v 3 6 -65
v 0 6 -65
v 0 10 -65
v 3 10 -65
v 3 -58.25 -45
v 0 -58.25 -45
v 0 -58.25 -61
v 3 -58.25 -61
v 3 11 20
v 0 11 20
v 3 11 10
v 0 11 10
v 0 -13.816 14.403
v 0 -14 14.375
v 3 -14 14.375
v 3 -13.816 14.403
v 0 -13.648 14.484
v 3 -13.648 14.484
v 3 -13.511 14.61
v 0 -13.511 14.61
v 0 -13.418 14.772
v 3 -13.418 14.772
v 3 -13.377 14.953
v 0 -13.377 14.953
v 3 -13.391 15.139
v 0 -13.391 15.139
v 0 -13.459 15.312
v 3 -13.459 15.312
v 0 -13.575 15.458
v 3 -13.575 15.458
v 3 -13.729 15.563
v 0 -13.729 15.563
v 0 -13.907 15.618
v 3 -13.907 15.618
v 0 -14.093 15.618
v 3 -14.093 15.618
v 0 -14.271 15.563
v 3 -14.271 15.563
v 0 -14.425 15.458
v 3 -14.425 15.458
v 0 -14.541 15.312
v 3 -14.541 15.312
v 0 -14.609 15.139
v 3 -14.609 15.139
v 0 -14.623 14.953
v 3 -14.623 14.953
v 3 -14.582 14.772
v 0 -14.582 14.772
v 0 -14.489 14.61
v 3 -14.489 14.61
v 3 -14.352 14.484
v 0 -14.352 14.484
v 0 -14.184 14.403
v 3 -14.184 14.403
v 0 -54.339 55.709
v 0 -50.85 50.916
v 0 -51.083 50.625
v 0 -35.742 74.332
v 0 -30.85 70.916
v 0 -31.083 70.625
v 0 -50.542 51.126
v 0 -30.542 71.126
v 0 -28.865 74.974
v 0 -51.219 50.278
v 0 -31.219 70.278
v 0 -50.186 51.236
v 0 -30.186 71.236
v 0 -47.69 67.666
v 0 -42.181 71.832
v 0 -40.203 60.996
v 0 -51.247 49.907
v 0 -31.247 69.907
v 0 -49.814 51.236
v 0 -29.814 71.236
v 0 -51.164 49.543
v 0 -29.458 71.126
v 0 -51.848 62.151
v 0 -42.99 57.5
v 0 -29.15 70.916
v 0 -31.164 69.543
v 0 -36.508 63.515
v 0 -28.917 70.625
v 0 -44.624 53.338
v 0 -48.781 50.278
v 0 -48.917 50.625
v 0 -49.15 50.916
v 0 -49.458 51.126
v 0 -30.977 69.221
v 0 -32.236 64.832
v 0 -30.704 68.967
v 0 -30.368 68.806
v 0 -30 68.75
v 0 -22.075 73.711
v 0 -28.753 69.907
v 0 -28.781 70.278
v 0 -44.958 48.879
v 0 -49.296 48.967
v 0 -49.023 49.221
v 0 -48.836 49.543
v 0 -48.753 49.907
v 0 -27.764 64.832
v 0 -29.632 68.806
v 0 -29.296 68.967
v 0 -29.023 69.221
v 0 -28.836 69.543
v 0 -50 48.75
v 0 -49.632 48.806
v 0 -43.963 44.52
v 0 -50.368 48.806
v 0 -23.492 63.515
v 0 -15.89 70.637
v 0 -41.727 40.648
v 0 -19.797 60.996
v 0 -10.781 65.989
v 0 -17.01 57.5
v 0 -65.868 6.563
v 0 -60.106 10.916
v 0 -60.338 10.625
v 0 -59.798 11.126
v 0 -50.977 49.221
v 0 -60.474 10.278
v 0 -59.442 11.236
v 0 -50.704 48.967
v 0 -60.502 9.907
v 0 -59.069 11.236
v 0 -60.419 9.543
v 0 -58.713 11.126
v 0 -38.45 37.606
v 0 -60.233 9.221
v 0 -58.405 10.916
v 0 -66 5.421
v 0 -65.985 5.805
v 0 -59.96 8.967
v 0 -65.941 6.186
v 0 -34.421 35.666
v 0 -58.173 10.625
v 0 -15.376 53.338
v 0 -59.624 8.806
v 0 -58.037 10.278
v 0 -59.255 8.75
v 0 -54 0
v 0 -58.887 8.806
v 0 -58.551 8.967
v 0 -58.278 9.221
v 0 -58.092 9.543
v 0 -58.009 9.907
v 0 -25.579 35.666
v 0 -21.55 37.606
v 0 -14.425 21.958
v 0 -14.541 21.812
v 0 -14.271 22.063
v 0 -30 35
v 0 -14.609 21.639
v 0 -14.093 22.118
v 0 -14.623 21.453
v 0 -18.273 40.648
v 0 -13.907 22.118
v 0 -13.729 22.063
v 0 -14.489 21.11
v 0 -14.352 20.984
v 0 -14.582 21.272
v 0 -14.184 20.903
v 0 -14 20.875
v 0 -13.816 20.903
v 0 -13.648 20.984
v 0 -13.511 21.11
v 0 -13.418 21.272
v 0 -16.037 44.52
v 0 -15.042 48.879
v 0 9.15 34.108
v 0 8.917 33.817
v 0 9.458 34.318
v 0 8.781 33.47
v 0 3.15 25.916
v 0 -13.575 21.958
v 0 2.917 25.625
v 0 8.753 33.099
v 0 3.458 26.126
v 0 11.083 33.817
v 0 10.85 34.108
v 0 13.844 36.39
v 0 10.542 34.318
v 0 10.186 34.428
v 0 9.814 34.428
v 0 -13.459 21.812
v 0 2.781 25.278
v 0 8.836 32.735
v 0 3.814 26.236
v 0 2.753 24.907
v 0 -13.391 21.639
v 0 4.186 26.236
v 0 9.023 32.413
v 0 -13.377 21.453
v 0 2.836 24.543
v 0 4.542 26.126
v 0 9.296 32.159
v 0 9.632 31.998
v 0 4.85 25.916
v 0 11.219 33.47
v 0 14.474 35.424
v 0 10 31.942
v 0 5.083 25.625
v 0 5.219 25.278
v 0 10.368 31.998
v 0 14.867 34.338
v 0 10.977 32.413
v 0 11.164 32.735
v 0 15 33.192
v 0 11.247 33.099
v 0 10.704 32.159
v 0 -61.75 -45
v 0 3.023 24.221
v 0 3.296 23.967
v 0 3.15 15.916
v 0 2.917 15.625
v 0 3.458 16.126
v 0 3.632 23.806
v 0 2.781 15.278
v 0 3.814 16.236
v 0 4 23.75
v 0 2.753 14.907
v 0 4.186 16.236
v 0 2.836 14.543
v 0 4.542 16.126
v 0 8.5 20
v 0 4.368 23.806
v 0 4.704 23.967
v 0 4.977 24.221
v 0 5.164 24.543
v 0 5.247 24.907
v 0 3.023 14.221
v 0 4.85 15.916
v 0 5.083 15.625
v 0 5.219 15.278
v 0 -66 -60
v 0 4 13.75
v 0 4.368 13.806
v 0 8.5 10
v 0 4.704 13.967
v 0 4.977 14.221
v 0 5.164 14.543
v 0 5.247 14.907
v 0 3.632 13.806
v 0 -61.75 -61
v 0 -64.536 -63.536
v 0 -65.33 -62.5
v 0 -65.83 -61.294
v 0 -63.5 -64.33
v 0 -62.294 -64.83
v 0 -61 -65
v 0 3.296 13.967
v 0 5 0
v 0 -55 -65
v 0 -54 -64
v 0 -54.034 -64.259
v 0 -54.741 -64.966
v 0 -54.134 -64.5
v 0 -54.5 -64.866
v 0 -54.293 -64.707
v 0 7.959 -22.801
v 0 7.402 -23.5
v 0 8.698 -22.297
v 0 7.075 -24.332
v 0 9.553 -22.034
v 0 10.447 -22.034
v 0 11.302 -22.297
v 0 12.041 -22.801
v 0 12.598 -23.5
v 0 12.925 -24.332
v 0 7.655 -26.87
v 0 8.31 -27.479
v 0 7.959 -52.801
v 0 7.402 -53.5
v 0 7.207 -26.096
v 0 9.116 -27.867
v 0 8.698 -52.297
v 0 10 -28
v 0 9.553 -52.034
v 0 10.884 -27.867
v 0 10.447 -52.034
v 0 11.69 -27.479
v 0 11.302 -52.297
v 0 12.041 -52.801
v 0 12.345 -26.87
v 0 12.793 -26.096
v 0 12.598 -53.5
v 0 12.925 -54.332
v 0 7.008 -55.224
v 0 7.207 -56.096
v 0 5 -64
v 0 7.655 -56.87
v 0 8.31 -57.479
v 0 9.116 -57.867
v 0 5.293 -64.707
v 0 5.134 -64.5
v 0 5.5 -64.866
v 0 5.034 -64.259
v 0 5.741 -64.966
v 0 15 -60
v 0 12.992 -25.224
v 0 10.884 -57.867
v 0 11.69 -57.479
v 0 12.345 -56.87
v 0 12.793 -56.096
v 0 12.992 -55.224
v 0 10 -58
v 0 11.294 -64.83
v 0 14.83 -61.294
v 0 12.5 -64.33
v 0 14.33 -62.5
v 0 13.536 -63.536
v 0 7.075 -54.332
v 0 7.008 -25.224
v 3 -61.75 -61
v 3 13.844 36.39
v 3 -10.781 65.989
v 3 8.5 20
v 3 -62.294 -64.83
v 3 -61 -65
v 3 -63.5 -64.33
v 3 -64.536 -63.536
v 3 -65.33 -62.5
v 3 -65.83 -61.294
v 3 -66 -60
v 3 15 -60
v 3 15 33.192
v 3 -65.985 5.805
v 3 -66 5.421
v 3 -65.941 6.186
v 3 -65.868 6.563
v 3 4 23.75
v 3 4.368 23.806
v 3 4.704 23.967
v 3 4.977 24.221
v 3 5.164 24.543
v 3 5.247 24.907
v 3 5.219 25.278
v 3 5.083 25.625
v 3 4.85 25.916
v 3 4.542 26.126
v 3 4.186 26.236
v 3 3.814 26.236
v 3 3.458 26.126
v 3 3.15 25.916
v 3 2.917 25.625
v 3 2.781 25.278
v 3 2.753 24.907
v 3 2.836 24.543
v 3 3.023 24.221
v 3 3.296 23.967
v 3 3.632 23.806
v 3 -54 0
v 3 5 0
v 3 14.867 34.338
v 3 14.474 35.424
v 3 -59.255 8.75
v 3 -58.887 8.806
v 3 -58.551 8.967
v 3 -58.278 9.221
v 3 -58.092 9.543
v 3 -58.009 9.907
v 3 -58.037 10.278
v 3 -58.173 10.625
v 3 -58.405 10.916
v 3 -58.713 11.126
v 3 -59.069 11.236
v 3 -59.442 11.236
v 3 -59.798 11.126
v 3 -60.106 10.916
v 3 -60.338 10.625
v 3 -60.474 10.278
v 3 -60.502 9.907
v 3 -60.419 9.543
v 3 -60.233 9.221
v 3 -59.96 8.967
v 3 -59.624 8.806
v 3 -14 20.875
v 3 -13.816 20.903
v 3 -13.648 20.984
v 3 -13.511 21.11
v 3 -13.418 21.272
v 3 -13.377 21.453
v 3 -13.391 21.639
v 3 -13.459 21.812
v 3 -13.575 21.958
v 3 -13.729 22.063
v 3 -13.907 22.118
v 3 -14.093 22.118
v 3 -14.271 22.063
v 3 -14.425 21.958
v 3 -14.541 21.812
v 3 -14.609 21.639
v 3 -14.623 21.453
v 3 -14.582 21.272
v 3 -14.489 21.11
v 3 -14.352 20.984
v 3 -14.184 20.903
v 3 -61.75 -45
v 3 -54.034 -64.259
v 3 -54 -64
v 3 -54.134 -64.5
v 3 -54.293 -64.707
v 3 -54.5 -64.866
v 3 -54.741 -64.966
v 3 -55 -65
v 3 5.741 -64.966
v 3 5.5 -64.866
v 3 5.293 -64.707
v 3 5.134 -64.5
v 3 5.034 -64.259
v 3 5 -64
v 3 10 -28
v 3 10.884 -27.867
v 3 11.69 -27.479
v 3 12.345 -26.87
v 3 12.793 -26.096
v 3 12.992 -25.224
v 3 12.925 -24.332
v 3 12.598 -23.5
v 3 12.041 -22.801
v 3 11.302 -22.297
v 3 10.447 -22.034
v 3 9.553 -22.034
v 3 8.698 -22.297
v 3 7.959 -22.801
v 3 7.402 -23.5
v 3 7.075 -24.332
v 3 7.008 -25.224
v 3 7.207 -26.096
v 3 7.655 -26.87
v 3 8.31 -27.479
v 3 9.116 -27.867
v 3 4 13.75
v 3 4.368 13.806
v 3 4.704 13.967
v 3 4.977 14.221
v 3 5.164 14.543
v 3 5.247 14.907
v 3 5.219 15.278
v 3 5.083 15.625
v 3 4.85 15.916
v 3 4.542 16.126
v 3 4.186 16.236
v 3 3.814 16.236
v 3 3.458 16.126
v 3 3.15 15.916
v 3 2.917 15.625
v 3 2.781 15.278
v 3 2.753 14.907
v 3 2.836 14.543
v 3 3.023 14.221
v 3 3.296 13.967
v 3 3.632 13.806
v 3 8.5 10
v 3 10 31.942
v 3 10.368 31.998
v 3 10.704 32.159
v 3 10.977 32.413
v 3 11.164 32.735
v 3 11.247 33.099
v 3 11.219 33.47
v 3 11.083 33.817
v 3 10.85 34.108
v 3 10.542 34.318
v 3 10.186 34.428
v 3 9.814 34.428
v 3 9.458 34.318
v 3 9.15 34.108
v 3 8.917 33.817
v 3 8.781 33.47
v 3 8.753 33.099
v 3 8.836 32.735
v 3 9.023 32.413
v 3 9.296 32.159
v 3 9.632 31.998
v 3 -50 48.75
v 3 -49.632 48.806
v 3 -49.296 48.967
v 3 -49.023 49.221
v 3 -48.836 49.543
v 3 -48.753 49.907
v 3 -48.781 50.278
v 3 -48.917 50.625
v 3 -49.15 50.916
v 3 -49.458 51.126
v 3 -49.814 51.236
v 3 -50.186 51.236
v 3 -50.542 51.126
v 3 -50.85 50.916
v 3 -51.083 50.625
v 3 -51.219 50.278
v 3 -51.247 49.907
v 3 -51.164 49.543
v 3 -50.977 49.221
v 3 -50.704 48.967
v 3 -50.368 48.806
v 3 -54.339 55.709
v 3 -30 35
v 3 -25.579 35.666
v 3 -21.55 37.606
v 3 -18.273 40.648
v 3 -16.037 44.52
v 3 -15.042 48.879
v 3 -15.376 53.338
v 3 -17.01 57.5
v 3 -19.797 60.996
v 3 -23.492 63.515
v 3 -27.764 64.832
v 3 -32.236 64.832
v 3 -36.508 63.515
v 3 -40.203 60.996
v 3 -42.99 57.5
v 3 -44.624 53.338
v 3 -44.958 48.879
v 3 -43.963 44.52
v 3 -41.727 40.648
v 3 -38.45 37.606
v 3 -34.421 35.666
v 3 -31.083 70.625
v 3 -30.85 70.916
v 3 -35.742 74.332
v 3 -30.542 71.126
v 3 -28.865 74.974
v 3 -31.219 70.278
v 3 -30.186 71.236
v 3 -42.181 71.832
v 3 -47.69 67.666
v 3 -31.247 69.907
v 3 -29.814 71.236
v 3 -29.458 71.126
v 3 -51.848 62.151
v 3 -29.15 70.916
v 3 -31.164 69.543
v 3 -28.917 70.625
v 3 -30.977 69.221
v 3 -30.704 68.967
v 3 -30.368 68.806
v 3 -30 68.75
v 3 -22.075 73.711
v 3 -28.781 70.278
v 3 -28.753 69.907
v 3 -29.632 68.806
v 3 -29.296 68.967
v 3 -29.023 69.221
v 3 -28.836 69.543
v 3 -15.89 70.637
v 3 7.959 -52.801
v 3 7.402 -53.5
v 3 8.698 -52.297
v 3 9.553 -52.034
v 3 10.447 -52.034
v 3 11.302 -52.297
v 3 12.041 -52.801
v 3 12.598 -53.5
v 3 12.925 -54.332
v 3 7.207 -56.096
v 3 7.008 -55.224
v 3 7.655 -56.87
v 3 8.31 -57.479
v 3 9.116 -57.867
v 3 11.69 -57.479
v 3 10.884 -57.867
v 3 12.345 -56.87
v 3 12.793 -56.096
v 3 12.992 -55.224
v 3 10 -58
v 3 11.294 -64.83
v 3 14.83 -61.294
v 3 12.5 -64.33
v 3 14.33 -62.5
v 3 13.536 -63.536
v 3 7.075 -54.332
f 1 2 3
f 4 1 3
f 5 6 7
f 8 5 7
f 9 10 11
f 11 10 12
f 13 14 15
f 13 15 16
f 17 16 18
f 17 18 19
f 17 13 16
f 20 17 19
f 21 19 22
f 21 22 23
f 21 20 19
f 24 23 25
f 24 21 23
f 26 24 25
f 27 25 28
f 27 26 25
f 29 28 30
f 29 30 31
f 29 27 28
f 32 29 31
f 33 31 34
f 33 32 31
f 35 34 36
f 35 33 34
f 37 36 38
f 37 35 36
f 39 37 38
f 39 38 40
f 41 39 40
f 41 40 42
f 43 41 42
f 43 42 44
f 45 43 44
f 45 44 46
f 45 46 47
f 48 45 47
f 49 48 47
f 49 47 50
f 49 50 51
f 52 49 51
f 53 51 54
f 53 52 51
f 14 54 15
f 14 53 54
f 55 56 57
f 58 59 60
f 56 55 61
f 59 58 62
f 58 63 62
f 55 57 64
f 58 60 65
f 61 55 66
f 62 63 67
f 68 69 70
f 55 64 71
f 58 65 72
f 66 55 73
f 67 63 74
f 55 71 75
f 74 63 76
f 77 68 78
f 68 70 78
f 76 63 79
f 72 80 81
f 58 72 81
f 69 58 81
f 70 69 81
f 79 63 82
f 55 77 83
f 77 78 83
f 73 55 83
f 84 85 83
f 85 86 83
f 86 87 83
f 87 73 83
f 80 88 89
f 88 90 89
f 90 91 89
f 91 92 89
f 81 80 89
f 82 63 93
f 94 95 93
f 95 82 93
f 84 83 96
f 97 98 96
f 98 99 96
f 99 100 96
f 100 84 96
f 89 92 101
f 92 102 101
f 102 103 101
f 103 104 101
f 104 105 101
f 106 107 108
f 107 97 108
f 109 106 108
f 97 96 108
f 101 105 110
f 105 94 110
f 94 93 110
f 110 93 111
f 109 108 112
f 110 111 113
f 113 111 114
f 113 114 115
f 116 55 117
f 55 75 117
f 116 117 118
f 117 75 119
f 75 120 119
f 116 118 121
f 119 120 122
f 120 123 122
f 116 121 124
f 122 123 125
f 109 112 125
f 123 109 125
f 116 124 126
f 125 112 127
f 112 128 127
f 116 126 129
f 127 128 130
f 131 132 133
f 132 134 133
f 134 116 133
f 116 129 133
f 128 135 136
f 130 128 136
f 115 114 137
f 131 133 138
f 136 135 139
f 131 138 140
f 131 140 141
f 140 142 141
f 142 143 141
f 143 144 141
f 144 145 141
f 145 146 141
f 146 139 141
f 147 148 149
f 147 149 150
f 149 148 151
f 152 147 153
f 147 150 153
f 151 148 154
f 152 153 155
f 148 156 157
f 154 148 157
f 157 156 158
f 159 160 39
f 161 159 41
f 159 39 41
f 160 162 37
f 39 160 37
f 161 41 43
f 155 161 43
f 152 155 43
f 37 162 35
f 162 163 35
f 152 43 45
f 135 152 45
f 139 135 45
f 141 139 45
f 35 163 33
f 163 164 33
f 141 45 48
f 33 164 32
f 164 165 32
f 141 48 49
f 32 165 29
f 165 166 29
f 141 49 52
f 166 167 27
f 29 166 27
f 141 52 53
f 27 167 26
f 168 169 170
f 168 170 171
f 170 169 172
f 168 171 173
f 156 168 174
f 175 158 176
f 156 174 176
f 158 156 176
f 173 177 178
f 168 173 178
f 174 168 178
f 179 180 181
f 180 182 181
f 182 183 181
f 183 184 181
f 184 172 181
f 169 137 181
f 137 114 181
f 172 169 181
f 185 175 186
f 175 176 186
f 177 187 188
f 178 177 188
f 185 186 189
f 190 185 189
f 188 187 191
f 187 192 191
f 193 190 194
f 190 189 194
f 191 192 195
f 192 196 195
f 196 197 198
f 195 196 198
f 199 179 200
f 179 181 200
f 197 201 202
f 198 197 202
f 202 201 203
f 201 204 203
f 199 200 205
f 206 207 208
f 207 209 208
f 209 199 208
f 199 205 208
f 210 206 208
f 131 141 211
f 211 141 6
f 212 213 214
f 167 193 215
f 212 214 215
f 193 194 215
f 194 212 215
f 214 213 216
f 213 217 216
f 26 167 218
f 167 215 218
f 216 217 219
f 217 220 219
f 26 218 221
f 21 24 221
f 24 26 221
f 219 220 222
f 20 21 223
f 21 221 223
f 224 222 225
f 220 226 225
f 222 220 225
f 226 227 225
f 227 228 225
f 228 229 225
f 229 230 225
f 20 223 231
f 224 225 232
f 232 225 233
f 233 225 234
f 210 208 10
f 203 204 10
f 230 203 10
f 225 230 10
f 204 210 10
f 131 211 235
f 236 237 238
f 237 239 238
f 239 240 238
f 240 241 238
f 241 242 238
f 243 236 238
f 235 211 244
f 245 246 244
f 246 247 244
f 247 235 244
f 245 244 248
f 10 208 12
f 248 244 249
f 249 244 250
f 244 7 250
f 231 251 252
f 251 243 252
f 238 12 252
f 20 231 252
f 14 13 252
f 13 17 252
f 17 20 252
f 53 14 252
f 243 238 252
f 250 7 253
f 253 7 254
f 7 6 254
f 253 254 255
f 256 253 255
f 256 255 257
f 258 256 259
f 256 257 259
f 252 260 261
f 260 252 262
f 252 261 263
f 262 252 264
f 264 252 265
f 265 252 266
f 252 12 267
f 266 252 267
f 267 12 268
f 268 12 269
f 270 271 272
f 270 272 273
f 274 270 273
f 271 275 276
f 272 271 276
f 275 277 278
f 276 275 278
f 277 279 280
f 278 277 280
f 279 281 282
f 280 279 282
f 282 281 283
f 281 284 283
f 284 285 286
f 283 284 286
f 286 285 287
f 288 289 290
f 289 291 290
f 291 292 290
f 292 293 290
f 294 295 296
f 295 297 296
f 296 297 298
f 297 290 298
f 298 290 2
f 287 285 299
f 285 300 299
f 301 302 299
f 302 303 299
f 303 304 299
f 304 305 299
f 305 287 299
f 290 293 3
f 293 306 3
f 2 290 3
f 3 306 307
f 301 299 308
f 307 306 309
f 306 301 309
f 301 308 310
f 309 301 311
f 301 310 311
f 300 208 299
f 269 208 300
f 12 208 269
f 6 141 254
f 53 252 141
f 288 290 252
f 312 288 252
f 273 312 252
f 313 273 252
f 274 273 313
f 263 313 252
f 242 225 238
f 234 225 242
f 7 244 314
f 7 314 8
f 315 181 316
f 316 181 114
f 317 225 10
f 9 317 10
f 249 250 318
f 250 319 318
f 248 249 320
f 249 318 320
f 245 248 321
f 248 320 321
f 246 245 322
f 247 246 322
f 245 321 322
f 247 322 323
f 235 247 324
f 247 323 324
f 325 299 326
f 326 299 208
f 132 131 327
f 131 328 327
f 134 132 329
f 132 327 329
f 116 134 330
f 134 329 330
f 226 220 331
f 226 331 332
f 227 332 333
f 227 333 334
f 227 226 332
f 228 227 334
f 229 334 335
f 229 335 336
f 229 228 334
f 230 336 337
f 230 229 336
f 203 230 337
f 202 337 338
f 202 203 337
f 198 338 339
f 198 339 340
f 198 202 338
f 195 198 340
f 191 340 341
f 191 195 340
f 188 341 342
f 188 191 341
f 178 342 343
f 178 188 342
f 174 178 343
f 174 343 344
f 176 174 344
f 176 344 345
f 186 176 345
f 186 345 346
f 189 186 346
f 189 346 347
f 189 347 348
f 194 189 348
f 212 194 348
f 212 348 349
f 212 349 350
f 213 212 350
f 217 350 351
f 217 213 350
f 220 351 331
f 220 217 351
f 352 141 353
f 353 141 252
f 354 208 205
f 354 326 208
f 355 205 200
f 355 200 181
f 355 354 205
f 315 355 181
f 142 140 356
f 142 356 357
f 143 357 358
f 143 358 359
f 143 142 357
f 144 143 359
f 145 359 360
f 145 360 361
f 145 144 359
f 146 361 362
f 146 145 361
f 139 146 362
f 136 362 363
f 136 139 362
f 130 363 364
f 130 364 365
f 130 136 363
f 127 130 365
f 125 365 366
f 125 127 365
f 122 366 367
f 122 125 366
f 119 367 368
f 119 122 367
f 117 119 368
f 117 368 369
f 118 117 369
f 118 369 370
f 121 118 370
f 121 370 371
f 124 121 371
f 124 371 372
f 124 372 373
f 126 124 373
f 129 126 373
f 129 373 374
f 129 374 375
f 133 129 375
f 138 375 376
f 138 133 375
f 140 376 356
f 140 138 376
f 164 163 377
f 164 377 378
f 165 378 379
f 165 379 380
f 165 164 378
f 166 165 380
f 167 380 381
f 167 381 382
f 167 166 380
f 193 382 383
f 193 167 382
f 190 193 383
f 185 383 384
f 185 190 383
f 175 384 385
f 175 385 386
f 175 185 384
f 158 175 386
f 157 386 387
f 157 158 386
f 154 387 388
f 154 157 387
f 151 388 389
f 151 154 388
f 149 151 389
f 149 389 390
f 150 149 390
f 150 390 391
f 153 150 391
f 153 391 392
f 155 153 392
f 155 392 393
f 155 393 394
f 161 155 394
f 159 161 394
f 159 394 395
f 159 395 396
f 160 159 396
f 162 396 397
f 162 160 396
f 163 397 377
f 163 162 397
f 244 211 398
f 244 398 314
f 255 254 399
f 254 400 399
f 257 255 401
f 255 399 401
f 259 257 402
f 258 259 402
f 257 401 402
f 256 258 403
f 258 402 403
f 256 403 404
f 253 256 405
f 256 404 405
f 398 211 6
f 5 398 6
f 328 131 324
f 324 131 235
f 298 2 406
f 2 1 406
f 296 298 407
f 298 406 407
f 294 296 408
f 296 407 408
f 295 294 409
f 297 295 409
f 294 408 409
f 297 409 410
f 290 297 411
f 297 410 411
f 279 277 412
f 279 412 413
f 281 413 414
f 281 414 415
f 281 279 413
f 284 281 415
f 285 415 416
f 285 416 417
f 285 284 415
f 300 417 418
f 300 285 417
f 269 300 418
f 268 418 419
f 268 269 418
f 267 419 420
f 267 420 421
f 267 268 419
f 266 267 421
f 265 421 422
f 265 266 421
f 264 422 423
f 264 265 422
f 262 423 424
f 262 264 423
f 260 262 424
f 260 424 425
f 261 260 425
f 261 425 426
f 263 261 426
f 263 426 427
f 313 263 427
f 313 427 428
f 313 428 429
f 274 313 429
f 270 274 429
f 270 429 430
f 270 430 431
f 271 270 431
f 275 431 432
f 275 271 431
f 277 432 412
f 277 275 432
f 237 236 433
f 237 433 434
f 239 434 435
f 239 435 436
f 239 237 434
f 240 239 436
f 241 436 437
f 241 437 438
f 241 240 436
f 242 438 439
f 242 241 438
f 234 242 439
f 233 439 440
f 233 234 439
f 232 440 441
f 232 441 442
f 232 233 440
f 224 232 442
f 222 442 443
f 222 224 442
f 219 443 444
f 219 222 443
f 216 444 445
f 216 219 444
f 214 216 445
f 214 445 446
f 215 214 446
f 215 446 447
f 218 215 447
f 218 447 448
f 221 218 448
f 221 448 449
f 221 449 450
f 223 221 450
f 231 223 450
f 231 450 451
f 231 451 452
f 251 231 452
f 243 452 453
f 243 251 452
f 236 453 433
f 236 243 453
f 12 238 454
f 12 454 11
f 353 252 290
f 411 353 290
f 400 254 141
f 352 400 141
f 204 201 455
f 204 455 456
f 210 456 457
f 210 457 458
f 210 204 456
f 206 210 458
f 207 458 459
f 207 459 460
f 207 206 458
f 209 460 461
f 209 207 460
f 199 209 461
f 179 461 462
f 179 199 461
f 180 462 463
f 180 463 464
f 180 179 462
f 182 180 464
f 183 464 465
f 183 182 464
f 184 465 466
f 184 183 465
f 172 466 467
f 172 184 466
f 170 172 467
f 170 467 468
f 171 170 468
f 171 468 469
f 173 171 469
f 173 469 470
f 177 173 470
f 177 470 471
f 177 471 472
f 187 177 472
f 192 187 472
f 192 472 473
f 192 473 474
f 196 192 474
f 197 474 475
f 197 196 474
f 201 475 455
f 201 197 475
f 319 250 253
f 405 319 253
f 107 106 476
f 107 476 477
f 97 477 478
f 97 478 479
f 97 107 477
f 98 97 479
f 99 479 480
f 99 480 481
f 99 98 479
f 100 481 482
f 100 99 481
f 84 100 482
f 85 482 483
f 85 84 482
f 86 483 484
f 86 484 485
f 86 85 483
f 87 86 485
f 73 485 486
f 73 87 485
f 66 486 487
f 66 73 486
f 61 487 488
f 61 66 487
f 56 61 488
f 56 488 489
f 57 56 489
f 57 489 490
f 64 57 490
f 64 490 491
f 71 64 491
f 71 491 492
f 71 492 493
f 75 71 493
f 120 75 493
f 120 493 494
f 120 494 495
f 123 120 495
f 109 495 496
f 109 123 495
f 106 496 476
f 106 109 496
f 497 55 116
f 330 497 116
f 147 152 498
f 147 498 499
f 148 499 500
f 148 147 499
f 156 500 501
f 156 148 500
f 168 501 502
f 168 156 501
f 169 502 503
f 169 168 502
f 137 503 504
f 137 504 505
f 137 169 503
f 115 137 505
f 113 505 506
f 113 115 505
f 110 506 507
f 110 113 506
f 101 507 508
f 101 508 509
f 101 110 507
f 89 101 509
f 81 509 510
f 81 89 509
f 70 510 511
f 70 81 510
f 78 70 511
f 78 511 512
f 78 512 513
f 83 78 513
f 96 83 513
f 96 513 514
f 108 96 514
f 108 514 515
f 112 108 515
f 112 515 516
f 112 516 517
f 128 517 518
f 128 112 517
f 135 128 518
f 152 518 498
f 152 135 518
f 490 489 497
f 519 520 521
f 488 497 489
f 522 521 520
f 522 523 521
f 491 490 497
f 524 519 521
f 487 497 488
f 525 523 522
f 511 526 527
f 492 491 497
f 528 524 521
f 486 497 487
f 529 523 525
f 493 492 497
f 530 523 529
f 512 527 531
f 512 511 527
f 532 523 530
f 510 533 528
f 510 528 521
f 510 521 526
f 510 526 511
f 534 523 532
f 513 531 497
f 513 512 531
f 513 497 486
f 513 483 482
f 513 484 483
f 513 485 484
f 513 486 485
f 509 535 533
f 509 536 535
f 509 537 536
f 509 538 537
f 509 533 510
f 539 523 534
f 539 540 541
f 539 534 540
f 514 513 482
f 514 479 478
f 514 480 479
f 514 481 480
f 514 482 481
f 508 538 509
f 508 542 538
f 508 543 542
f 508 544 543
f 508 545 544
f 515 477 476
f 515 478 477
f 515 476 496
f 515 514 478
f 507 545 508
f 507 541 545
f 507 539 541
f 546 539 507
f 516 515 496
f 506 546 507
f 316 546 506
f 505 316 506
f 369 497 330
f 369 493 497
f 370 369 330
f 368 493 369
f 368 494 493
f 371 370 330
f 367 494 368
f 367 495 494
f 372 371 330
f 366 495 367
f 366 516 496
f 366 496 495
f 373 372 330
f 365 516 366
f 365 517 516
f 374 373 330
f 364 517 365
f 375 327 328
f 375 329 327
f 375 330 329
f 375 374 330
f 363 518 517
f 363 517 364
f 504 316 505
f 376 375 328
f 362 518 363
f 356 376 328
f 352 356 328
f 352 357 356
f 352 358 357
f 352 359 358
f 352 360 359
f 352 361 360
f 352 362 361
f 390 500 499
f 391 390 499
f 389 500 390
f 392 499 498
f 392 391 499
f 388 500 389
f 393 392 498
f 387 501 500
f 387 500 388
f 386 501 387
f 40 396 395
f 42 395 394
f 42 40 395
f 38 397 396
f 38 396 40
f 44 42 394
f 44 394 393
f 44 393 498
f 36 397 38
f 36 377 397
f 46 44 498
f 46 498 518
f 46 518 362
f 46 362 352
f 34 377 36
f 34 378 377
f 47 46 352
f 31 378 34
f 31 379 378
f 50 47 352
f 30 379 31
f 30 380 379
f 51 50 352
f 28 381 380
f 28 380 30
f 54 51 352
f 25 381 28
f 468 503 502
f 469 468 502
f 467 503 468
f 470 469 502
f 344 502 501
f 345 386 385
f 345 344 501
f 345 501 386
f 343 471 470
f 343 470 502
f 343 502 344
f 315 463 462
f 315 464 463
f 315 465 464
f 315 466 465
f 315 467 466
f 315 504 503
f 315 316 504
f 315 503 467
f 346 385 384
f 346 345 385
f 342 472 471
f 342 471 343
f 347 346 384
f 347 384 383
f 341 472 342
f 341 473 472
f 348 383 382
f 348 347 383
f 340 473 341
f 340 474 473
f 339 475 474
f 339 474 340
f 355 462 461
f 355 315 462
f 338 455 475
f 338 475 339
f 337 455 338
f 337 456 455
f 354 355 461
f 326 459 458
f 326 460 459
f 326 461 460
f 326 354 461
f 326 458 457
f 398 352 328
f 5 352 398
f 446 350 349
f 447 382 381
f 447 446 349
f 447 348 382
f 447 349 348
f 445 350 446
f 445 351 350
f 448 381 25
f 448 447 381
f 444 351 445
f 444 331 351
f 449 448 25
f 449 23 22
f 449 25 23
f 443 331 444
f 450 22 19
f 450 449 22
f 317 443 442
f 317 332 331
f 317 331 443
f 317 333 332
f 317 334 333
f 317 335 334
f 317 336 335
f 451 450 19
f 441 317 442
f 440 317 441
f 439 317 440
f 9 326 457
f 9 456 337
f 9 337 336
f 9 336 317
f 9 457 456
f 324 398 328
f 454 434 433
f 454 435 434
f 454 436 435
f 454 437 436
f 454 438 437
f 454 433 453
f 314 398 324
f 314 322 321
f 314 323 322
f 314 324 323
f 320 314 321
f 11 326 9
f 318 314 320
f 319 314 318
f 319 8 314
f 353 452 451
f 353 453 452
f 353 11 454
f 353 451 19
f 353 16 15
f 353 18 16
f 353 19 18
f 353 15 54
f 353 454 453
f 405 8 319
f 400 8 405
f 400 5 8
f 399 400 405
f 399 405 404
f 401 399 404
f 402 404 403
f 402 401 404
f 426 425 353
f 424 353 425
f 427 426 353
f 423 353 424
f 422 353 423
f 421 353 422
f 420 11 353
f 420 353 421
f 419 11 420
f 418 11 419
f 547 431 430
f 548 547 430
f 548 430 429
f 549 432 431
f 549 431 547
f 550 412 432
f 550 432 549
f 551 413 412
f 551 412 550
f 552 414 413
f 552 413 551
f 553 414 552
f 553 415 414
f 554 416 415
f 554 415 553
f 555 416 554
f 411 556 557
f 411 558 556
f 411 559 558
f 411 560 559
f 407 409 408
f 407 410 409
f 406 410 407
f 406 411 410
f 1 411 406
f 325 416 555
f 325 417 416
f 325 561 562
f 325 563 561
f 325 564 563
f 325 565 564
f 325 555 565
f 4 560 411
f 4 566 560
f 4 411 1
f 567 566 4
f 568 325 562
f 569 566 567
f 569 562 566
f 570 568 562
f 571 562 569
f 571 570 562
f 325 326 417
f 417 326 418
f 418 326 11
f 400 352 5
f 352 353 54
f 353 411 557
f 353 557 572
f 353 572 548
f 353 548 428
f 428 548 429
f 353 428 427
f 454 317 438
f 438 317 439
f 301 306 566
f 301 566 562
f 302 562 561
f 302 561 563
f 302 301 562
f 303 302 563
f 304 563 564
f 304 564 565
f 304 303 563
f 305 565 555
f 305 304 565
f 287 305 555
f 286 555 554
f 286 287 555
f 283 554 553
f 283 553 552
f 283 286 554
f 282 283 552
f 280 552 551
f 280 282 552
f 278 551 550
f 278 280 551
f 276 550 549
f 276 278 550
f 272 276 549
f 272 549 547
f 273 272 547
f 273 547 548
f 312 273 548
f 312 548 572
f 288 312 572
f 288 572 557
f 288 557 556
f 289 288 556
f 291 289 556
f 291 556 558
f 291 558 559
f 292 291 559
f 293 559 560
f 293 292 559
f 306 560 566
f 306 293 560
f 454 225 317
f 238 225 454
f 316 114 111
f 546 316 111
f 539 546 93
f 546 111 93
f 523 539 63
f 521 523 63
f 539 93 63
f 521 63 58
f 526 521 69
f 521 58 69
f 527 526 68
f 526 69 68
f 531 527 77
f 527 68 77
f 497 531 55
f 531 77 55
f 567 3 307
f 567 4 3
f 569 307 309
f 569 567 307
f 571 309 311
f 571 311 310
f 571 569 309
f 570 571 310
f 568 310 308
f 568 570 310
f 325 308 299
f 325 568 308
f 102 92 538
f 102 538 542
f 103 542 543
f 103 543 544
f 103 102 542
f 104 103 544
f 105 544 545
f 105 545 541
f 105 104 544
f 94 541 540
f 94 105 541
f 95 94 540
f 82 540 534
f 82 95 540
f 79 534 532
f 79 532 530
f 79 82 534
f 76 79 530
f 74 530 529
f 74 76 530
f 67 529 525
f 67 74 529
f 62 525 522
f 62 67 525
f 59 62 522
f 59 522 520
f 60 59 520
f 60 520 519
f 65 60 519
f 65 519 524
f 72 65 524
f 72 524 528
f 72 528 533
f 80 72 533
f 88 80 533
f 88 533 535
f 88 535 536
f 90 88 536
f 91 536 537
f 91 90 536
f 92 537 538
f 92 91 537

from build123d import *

# Parameters (mm, degrees)
SKETCH1_R           = 15
SKETCH1_R_2         = 3
SKETCH1_R_3         = 1.25
SKETCH1_R_4         = 0.625
SKETCH1_W           = 10
SKETCH1_H           = 2.5
SKETCH1_W_2         = 16
SKETCH1_H_2         = 3.5
BOSS_EXTRUDE1_DEPTH = 3
FILLET1_R           = 5
FILLET2_R           = 1


with BuildPart() as part:
    # Sketch1 → Boss-Extrude1 (new body)
    with BuildSketch(Plane(origin=(0, 0, 0), x_dir=(0, 0, -1), z_dir=(1, 0, 0))):
        with BuildLine():
            Line((0, 5), (65, 5))
            Line((65, 5), (65, 15))
            Line((65, 15), (-35, 15))
            Line((-35, 15), (-65.988977704, -10.781451876))
            ThreePointArc((-65.988977704, -10.781451876), (-74.331609313, -35.742193679), (-55.709440186, -54.339315783))
            Line((-55.709440186, -54.339315783), (-6, -66))
            Line((-6, -66), (65, -66))
            Line((65, -66), (65, -54))
            Line((65, -54), (0, -54))
            Line((0, -54), (0, 5))
        make_face()
        with Locations((-50, -30)):
            Circle(SKETCH1_R, mode=Mode.SUBTRACT)
        with Locations((55, 10)):
            Circle(SKETCH1_R_2, mode=Mode.SUBTRACT)
        with Locations((25, 10)):
            Circle(SKETCH1_R_2, mode=Mode.SUBTRACT)
        with Locations((-33.192050804, 10)):
            Circle(SKETCH1_R_3, mode=Mode.SUBTRACT)
        with Locations((-50, -50)):
            Circle(SKETCH1_R_3, mode=Mode.SUBTRACT)
        with Locations((-70, -30)):
            Circle(SKETCH1_R_3, mode=Mode.SUBTRACT)
        with Locations((-10, -59.255419511)):
            Circle(SKETCH1_R_3, mode=Mode.SUBTRACT)
        with Locations((-25, 4)):
            Circle(SKETCH1_R_3, mode=Mode.SUBTRACT)
        with Locations((-15, 4)):
            Circle(SKETCH1_R_3, mode=Mode.SUBTRACT)
        with Locations((-15, -14)):
            Circle(SKETCH1_R_4, mode=Mode.SUBTRACT)
        with Locations((-21.5, -14)):
            Circle(SKETCH1_R_4, mode=Mode.SUBTRACT)
        with Locations((-15, 9.75)):
            Rectangle(SKETCH1_W, SKETCH1_H, mode=Mode.SUBTRACT)
        with Locations((53, -60)):
            Rectangle(SKETCH1_W_2, SKETCH1_H_2, mode=Mode.SUBTRACT)
    extrude(amount=BOSS_EXTRUDE1_DEPTH)

    # Fillet1
    fillet1_edges = [part.edges().sort_by_distance(p)[0] for p in [
        (1.5, -66, -65),
        (1.5, -66, 6),
        (1.5, 15, 35),
        (1.5, 15, -65),
    ]]
    fillet(fillet1_edges, radius=FILLET1_R)

    # Fillet2
    fillet2_edges = [part.edges().sort_by_distance(p)[0] for p in [
        (1.5, 5, -65),
        (1.5, -54, -65),
    ]]
    fillet(fillet2_edges, radius=FILLET2_R)


solid = part.part
